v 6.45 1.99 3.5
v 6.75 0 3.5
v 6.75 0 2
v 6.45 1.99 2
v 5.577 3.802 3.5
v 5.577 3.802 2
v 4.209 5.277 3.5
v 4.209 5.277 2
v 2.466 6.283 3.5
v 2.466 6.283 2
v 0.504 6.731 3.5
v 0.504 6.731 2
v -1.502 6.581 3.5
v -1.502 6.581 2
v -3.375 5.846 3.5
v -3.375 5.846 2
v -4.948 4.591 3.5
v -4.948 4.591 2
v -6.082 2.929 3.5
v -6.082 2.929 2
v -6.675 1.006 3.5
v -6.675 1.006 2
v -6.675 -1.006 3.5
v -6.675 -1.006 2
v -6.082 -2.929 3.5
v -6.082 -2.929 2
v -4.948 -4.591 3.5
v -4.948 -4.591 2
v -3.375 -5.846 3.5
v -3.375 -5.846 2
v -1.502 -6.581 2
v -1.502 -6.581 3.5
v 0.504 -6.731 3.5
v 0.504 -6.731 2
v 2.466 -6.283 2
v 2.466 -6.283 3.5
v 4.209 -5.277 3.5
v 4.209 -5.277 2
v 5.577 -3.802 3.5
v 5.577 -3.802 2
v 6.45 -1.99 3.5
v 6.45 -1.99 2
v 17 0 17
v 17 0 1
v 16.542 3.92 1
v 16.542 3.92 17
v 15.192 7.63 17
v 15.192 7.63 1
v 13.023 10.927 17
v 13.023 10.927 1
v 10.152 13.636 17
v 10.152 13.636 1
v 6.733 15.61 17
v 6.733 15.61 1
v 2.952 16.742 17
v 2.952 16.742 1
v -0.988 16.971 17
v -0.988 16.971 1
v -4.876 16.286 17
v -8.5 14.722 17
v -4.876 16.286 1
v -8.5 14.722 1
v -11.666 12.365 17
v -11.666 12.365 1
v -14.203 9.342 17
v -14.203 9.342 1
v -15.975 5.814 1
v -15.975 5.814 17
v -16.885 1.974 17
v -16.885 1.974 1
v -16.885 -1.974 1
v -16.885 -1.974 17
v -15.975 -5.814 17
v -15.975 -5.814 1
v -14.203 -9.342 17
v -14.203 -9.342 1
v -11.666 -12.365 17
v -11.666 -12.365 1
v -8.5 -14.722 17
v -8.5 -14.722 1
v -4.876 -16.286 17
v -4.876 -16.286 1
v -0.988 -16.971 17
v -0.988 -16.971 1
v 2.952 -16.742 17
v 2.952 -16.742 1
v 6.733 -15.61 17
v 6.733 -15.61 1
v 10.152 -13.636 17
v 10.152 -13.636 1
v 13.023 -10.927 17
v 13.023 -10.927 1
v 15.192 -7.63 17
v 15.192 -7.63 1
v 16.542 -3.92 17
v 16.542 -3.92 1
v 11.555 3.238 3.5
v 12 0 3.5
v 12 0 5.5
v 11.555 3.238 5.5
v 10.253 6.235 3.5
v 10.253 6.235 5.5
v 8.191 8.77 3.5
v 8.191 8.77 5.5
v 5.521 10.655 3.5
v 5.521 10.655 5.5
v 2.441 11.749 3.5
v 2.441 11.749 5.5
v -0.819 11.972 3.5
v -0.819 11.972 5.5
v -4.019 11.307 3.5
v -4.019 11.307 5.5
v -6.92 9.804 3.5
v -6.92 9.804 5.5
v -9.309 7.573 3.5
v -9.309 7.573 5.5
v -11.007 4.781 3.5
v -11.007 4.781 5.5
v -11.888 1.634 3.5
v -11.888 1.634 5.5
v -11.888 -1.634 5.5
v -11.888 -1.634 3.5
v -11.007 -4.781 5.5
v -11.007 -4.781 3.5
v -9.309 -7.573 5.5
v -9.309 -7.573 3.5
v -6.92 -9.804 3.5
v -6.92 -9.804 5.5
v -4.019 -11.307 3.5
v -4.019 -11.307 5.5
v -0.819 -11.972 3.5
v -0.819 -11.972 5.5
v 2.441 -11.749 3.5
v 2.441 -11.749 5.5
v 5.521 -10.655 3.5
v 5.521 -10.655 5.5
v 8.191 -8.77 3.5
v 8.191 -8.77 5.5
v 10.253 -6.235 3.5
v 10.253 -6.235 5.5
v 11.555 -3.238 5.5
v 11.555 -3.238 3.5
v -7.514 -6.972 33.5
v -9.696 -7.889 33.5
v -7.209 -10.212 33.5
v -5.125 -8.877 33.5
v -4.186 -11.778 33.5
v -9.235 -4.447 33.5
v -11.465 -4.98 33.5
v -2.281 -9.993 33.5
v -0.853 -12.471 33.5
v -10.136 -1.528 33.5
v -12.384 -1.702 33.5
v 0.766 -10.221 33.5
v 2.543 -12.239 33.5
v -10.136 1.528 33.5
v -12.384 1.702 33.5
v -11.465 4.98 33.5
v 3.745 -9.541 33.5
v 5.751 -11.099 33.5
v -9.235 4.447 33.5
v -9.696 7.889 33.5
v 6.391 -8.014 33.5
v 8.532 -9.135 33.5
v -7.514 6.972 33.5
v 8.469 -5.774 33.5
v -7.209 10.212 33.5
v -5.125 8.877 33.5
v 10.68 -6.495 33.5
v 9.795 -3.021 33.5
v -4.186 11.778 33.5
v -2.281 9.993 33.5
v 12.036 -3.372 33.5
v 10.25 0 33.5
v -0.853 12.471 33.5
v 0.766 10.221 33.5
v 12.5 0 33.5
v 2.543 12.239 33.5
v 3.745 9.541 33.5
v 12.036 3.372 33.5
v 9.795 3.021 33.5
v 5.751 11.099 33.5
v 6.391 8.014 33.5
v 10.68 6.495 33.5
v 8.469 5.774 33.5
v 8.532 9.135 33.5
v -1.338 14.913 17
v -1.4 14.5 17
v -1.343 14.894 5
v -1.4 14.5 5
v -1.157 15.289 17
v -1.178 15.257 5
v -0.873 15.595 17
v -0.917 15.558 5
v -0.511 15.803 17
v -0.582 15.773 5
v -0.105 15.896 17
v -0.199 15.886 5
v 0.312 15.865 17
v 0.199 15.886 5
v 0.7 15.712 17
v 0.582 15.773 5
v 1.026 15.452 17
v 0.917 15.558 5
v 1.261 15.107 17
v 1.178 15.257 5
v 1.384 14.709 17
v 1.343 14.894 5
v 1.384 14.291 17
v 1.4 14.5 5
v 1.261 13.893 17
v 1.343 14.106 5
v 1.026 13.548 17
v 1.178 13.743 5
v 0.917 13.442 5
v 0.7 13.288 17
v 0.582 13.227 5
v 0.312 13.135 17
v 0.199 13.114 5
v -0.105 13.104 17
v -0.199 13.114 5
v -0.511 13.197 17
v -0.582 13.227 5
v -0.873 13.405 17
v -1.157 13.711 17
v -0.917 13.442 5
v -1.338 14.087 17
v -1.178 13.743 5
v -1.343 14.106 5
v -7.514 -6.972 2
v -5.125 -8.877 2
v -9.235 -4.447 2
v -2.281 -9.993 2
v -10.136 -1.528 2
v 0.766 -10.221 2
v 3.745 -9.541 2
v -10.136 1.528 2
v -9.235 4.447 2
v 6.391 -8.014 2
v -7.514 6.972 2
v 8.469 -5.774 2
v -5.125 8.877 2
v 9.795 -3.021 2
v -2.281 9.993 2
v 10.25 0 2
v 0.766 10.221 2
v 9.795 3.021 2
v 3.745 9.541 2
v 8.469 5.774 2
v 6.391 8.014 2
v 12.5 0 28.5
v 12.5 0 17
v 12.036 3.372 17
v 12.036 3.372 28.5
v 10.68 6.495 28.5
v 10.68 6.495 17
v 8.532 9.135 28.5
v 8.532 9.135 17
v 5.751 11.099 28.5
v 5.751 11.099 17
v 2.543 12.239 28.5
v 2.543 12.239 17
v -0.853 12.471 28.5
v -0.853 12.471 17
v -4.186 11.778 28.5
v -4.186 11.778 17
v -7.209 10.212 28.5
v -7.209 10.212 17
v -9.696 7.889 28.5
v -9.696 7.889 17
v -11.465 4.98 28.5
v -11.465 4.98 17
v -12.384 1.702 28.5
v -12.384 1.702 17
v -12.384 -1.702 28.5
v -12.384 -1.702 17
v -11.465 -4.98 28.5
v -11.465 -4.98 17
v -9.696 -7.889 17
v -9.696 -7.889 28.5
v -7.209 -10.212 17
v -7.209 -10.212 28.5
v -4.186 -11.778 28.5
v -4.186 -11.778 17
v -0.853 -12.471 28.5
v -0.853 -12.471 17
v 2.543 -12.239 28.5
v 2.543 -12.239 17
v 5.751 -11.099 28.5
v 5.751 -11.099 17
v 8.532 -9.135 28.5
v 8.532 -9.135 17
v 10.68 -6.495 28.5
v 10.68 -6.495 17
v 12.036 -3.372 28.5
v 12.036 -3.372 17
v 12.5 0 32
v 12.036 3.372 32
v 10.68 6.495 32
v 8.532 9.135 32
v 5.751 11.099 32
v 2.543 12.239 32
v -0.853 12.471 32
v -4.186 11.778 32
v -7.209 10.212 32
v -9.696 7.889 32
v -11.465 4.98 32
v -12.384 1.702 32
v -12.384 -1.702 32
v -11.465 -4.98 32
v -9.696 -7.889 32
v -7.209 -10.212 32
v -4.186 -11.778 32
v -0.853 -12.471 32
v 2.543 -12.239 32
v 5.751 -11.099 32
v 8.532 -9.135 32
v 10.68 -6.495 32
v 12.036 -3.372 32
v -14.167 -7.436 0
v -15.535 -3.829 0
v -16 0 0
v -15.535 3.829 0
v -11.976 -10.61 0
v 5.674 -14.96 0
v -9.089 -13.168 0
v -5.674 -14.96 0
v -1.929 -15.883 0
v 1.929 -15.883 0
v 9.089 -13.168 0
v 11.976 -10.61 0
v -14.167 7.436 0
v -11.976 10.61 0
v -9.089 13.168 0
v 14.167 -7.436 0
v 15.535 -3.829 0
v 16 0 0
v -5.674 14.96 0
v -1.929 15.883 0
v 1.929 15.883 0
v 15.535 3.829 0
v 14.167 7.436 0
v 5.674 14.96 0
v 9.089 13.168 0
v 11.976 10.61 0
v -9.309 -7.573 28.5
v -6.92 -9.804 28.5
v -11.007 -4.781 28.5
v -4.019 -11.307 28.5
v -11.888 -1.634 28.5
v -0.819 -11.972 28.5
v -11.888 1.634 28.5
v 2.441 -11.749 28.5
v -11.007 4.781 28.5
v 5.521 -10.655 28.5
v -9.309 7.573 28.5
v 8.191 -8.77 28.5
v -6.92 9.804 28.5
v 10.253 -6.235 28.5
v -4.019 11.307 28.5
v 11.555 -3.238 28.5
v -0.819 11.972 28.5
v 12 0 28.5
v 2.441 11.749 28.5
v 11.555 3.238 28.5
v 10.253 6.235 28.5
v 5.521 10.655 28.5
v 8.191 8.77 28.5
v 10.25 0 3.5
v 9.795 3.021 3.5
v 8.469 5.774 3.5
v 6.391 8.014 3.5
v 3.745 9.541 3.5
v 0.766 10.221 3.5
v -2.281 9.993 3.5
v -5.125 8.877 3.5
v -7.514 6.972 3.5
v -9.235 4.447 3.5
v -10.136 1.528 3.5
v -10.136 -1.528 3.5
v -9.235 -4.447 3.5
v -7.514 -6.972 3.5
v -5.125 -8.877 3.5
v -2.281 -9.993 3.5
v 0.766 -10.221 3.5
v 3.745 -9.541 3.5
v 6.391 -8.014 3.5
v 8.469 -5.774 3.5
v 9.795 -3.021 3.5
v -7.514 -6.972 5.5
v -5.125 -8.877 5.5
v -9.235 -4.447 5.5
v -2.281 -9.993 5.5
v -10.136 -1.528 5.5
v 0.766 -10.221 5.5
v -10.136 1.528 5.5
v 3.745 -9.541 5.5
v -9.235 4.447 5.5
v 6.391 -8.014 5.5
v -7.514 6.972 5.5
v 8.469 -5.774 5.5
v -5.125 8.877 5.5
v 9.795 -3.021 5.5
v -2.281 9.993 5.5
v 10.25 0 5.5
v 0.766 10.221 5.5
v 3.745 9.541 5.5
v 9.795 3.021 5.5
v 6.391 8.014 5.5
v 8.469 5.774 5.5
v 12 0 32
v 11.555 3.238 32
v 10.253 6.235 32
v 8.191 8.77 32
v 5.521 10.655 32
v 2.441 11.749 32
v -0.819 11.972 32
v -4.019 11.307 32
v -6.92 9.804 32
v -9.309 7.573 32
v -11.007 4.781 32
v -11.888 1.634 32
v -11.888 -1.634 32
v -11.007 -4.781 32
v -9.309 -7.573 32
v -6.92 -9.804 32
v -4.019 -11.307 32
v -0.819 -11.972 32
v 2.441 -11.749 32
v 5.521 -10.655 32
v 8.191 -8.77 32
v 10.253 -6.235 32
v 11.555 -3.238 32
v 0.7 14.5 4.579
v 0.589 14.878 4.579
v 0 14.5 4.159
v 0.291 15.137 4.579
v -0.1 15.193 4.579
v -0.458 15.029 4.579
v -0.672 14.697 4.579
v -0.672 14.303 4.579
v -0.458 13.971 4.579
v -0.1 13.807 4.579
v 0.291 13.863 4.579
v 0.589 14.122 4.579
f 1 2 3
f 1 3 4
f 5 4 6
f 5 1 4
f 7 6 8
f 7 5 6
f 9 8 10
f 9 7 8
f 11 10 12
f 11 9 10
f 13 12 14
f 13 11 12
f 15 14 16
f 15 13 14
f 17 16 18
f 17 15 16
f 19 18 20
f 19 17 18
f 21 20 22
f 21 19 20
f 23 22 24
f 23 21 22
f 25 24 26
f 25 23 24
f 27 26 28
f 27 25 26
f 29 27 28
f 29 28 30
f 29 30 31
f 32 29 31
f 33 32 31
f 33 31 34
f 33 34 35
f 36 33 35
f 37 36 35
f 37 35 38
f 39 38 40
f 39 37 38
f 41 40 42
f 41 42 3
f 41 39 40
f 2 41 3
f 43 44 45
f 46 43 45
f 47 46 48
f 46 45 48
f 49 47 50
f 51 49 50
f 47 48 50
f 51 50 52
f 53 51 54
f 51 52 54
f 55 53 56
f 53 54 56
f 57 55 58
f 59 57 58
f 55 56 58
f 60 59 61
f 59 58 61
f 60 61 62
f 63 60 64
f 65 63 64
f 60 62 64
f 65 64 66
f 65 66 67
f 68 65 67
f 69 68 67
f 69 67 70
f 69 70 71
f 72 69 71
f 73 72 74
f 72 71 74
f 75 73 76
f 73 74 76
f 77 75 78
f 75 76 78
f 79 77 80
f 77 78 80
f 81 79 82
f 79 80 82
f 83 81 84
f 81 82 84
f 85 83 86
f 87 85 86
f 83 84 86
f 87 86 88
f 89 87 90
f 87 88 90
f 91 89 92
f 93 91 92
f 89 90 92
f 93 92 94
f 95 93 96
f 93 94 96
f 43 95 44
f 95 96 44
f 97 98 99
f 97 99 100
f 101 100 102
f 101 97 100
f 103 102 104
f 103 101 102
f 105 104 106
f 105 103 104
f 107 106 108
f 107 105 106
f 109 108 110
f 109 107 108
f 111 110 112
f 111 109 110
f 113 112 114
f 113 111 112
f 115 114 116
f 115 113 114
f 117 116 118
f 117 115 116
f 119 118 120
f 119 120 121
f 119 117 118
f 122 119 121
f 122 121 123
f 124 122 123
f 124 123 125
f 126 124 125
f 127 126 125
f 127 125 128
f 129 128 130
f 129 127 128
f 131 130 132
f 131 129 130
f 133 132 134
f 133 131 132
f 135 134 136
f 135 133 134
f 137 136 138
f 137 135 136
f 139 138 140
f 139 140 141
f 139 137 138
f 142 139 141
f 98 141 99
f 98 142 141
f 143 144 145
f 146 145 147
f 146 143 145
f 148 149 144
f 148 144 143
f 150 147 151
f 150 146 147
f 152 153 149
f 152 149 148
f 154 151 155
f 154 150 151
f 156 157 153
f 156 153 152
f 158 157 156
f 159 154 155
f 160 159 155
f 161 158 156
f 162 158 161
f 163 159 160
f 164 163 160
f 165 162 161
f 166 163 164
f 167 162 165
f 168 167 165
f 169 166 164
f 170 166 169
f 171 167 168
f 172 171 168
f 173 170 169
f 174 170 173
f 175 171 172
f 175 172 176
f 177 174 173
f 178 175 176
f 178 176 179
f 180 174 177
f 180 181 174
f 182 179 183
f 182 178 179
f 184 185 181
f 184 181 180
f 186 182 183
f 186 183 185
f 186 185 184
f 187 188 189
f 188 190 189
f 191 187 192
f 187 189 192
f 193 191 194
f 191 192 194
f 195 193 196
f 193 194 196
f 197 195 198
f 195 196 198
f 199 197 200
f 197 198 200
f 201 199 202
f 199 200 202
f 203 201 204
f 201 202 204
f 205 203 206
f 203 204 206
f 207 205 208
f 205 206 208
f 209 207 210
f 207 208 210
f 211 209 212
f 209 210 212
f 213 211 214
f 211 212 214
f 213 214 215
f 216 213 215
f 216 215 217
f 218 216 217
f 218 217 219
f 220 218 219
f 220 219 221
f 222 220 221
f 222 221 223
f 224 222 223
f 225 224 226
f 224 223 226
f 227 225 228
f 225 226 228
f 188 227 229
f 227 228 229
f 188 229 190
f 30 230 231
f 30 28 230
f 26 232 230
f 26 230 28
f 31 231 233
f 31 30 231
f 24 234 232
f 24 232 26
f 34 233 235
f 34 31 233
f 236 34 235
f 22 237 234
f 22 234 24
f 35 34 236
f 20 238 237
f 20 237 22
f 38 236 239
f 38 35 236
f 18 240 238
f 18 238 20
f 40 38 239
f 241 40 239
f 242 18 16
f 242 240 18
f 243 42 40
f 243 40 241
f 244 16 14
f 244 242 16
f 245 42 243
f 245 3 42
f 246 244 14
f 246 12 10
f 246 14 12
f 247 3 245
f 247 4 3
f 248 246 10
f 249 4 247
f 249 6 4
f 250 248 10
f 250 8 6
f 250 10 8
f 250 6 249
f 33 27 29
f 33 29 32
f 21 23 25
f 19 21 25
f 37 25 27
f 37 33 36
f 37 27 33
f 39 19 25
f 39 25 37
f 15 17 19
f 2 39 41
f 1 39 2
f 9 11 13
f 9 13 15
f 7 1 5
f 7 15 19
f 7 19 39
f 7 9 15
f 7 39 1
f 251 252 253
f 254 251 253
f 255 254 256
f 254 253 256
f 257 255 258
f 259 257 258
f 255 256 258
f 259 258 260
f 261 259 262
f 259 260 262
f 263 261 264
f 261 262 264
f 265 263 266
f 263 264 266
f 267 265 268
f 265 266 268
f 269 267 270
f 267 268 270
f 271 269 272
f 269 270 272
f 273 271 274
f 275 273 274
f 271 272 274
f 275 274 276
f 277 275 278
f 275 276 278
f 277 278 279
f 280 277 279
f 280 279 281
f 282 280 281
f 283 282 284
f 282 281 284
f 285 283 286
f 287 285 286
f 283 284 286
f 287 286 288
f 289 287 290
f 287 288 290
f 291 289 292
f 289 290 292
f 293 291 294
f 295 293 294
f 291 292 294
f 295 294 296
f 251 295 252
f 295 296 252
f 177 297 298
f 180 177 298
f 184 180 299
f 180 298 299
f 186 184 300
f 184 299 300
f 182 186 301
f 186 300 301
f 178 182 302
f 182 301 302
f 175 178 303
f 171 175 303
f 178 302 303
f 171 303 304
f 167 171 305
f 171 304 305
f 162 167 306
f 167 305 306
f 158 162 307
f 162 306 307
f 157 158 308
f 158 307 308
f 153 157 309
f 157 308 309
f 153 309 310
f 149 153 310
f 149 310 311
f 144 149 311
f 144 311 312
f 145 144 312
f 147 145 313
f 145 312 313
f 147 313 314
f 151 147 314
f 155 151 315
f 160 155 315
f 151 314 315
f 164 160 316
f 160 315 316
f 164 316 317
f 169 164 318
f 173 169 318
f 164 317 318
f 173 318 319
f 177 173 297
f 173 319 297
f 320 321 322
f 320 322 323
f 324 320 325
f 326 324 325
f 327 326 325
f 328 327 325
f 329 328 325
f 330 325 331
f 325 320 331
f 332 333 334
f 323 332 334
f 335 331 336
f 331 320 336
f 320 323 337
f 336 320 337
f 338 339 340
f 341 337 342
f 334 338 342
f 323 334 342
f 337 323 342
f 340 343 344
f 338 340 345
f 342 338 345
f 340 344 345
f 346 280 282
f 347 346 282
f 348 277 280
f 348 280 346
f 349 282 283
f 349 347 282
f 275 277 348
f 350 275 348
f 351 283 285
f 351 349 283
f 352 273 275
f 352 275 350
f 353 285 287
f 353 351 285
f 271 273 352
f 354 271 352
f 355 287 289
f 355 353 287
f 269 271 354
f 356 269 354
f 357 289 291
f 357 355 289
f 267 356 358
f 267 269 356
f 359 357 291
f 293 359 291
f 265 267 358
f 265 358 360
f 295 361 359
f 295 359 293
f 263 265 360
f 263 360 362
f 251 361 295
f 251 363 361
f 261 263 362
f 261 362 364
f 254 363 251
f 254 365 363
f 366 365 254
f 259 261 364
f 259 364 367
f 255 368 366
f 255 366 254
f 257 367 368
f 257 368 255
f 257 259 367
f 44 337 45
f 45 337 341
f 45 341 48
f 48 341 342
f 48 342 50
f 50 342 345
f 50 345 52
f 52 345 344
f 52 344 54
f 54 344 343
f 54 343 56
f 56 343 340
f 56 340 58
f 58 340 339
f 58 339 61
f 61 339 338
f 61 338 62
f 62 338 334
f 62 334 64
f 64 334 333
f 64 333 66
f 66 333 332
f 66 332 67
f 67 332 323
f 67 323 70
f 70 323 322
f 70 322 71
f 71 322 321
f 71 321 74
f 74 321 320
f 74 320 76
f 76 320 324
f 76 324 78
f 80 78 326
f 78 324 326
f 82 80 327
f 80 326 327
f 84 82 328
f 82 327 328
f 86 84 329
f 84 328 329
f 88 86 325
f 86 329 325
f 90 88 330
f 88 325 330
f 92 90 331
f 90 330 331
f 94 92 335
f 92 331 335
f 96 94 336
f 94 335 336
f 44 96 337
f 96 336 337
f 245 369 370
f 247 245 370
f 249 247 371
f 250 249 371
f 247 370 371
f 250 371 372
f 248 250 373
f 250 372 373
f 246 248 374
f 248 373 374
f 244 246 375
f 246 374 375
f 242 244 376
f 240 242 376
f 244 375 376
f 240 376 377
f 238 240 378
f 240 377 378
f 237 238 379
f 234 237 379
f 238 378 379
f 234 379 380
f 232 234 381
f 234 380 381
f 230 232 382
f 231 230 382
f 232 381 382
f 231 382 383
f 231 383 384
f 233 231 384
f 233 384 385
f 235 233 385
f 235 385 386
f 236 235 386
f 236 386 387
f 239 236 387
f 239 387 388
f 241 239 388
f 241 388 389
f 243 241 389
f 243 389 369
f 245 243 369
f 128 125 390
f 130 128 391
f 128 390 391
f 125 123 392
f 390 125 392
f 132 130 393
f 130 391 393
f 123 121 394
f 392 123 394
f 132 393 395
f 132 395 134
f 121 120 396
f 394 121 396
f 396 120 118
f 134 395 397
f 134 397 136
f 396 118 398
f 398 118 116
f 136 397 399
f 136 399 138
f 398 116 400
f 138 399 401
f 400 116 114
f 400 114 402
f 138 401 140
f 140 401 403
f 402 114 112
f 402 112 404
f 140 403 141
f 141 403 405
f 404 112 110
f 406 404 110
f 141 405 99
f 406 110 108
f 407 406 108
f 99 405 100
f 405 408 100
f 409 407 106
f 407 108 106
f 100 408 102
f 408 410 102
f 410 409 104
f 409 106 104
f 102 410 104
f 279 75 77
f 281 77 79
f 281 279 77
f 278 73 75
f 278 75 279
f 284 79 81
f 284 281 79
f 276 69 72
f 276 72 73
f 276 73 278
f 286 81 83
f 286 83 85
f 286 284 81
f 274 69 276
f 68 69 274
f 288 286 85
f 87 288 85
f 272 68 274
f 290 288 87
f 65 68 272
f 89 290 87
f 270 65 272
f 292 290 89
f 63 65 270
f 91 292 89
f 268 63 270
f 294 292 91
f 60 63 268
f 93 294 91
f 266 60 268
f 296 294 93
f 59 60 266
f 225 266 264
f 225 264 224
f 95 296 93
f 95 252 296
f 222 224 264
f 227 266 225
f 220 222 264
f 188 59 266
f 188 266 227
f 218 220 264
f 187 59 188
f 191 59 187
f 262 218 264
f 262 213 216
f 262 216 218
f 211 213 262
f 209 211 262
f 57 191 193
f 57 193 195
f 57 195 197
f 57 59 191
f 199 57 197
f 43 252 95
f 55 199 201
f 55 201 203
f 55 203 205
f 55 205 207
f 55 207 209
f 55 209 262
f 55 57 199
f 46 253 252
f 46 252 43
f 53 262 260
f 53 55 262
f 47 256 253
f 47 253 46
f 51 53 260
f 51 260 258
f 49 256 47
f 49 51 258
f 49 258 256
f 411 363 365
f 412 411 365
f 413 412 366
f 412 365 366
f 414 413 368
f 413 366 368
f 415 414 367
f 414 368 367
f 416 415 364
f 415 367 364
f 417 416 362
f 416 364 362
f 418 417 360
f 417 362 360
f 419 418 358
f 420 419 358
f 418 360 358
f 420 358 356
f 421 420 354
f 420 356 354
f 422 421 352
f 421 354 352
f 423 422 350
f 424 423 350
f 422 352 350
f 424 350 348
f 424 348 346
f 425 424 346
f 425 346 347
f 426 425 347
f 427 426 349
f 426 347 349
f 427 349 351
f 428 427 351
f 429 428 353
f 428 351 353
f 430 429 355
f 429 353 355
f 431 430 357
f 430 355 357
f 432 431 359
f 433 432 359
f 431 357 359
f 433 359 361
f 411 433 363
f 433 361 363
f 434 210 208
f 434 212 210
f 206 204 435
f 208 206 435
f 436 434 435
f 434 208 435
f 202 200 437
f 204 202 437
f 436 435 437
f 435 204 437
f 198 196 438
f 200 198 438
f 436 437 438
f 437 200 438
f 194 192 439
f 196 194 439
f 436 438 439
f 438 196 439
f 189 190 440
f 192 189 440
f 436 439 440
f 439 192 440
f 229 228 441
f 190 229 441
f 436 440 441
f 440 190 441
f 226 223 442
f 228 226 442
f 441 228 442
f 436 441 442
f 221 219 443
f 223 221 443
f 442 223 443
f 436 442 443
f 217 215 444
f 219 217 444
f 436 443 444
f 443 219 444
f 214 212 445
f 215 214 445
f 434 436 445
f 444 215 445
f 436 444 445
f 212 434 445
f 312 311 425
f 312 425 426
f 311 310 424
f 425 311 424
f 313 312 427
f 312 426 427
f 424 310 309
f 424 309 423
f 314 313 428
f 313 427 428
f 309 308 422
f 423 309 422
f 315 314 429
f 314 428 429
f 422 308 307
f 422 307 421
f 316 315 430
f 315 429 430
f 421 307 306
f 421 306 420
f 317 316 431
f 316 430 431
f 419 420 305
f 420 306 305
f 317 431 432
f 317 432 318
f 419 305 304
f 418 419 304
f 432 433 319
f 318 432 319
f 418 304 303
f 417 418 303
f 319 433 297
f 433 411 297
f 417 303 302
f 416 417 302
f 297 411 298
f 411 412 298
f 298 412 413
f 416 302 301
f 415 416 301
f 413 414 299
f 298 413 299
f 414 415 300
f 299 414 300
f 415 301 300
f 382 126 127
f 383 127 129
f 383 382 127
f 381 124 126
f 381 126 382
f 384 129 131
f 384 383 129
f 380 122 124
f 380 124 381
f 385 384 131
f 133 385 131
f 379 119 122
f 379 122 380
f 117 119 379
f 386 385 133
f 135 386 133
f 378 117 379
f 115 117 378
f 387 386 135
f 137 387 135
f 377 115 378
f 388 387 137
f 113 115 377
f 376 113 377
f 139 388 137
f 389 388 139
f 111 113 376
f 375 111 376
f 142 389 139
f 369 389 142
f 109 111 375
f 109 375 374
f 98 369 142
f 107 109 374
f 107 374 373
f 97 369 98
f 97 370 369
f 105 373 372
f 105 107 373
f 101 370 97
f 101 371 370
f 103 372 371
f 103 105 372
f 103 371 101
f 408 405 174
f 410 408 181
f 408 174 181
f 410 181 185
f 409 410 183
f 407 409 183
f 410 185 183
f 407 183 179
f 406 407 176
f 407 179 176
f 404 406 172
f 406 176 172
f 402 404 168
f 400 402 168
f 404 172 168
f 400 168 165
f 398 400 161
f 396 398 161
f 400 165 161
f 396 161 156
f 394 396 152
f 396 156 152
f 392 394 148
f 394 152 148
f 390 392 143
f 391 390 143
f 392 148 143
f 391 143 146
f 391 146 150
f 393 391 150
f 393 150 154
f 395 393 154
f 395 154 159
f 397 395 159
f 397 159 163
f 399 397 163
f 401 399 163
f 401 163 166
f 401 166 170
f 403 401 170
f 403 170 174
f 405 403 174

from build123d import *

# Parameters (mm, degrees)
ESQUISSE1_R                    = 17
BOSS_EXTRU_1_DEPTH             = 17
ESQUISSE2_R                    = 12.5
BOSS_EXTRU_2_DEPTH             = 11.5
ESQUISSE3_R                    = 12
BOSS_EXTRU_3_DEPTH             = 3.5
ESQUISSE4_R                    = 12.5
BOSS_EXTRU_4_DEPTH             = 1.5
ESQUISSE5_R                    = 10.25
ENL_V_MAT_EXTRU_1_DEPTH        = 30
ESQUISSE6_R                    = 10.25
ESQUISSE6_R_2                  = 6.75
ENL_V_MAT_EXTRU_2_DEPTH        = 1.5
ESQUISSE7_R                    = 12
ESQUISSE7_R_2                  = 10.25
ENL_V_MAT_EXTRU_3_DEPTH        = 2
F_2_8_2_8_DIAMETER_HOLE1_D     = 2.8
F_2_8_2_8_DIAMETER_HOLE1_DEPTH = 12
F_2_8_2_8_DIAMETER_HOLE1_TIP   = 0.841204867
CHANFREIN1_SIZE                = 1


with BuildPart() as part:
    # Esquisse1 → Boss.-Extru.1 (new body)
    with BuildSketch(Plane.XY):
        Circle(ESQUISSE1_R)
    extrude(amount=BOSS_EXTRU_1_DEPTH)

    # Esquisse2 → Boss.-Extru.2 (add)
    with BuildSketch(Plane.XY.offset(17)):
        Circle(ESQUISSE2_R)
    extrude(amount=BOSS_EXTRU_2_DEPTH)

    # Esquisse3 → Boss.-Extru.3 (add)
    with BuildSketch(Plane.XY.offset(28.5)):
        Circle(ESQUISSE3_R)
    extrude(amount=BOSS_EXTRU_3_DEPTH)

    # Esquisse4 → Boss.-Extru.4 (add)
    with BuildSketch(Plane.XY.offset(32)):
        Circle(ESQUISSE4_R)
    extrude(amount=BOSS_EXTRU_4_DEPTH)

    # Esquisse5 → Enlèv. mat.-Extru.1 (cut)
    with BuildSketch(Plane.XY.offset(33.5)):
        Circle(ESQUISSE5_R)
    extrude(amount=-ENL_V_MAT_EXTRU_1_DEPTH, mode=Mode.SUBTRACT)

    # Esquisse6 → Enlèv. mat.-Extru.2 (cut)
    with BuildSketch(Plane.XY.offset(3.5)):
        Circle(ESQUISSE6_R)
        Circle(ESQUISSE6_R_2, mode=Mode.SUBTRACT)
    extrude(amount=-ENL_V_MAT_EXTRU_2_DEPTH, mode=Mode.SUBTRACT)

    # Esquisse7 → Enlèv. mat.-Extru.3 (cut)
    with BuildSketch(Plane.XY.offset(3.5)):
        Circle(ESQUISSE7_R)
        Circle(ESQUISSE7_R_2, mode=Mode.SUBTRACT)
    extrude(amount=ENL_V_MAT_EXTRU_3_DEPTH, mode=Mode.SUBTRACT)

    # Ø2.8 (2.8) Diameter Hole1
    with Locations(Plane.XY.offset(17)):
        with Locations((0, 14.5)):
            Hole(F_2_8_2_8_DIAMETER_HOLE1_D / 2, depth=F_2_8_2_8_DIAMETER_HOLE1_DEPTH)
            with Locations((0, 0, -(F_2_8_2_8_DIAMETER_HOLE1_DEPTH + F_2_8_2_8_DIAMETER_HOLE1_TIP / 2))):  # 118° drill point
                Cone(0, F_2_8_2_8_DIAMETER_HOLE1_D / 2, F_2_8_2_8_DIAMETER_HOLE1_TIP, mode=Mode.SUBTRACT)

    # Chanfrein1
    chanfrein1_edges = [part.edges().sort_by_distance(p)[0] for p in [
        (-17, 0, 0),
    ]]
    chamfer(chanfrein1_edges, length=CHANFREIN1_SIZE)


solid = part.part
